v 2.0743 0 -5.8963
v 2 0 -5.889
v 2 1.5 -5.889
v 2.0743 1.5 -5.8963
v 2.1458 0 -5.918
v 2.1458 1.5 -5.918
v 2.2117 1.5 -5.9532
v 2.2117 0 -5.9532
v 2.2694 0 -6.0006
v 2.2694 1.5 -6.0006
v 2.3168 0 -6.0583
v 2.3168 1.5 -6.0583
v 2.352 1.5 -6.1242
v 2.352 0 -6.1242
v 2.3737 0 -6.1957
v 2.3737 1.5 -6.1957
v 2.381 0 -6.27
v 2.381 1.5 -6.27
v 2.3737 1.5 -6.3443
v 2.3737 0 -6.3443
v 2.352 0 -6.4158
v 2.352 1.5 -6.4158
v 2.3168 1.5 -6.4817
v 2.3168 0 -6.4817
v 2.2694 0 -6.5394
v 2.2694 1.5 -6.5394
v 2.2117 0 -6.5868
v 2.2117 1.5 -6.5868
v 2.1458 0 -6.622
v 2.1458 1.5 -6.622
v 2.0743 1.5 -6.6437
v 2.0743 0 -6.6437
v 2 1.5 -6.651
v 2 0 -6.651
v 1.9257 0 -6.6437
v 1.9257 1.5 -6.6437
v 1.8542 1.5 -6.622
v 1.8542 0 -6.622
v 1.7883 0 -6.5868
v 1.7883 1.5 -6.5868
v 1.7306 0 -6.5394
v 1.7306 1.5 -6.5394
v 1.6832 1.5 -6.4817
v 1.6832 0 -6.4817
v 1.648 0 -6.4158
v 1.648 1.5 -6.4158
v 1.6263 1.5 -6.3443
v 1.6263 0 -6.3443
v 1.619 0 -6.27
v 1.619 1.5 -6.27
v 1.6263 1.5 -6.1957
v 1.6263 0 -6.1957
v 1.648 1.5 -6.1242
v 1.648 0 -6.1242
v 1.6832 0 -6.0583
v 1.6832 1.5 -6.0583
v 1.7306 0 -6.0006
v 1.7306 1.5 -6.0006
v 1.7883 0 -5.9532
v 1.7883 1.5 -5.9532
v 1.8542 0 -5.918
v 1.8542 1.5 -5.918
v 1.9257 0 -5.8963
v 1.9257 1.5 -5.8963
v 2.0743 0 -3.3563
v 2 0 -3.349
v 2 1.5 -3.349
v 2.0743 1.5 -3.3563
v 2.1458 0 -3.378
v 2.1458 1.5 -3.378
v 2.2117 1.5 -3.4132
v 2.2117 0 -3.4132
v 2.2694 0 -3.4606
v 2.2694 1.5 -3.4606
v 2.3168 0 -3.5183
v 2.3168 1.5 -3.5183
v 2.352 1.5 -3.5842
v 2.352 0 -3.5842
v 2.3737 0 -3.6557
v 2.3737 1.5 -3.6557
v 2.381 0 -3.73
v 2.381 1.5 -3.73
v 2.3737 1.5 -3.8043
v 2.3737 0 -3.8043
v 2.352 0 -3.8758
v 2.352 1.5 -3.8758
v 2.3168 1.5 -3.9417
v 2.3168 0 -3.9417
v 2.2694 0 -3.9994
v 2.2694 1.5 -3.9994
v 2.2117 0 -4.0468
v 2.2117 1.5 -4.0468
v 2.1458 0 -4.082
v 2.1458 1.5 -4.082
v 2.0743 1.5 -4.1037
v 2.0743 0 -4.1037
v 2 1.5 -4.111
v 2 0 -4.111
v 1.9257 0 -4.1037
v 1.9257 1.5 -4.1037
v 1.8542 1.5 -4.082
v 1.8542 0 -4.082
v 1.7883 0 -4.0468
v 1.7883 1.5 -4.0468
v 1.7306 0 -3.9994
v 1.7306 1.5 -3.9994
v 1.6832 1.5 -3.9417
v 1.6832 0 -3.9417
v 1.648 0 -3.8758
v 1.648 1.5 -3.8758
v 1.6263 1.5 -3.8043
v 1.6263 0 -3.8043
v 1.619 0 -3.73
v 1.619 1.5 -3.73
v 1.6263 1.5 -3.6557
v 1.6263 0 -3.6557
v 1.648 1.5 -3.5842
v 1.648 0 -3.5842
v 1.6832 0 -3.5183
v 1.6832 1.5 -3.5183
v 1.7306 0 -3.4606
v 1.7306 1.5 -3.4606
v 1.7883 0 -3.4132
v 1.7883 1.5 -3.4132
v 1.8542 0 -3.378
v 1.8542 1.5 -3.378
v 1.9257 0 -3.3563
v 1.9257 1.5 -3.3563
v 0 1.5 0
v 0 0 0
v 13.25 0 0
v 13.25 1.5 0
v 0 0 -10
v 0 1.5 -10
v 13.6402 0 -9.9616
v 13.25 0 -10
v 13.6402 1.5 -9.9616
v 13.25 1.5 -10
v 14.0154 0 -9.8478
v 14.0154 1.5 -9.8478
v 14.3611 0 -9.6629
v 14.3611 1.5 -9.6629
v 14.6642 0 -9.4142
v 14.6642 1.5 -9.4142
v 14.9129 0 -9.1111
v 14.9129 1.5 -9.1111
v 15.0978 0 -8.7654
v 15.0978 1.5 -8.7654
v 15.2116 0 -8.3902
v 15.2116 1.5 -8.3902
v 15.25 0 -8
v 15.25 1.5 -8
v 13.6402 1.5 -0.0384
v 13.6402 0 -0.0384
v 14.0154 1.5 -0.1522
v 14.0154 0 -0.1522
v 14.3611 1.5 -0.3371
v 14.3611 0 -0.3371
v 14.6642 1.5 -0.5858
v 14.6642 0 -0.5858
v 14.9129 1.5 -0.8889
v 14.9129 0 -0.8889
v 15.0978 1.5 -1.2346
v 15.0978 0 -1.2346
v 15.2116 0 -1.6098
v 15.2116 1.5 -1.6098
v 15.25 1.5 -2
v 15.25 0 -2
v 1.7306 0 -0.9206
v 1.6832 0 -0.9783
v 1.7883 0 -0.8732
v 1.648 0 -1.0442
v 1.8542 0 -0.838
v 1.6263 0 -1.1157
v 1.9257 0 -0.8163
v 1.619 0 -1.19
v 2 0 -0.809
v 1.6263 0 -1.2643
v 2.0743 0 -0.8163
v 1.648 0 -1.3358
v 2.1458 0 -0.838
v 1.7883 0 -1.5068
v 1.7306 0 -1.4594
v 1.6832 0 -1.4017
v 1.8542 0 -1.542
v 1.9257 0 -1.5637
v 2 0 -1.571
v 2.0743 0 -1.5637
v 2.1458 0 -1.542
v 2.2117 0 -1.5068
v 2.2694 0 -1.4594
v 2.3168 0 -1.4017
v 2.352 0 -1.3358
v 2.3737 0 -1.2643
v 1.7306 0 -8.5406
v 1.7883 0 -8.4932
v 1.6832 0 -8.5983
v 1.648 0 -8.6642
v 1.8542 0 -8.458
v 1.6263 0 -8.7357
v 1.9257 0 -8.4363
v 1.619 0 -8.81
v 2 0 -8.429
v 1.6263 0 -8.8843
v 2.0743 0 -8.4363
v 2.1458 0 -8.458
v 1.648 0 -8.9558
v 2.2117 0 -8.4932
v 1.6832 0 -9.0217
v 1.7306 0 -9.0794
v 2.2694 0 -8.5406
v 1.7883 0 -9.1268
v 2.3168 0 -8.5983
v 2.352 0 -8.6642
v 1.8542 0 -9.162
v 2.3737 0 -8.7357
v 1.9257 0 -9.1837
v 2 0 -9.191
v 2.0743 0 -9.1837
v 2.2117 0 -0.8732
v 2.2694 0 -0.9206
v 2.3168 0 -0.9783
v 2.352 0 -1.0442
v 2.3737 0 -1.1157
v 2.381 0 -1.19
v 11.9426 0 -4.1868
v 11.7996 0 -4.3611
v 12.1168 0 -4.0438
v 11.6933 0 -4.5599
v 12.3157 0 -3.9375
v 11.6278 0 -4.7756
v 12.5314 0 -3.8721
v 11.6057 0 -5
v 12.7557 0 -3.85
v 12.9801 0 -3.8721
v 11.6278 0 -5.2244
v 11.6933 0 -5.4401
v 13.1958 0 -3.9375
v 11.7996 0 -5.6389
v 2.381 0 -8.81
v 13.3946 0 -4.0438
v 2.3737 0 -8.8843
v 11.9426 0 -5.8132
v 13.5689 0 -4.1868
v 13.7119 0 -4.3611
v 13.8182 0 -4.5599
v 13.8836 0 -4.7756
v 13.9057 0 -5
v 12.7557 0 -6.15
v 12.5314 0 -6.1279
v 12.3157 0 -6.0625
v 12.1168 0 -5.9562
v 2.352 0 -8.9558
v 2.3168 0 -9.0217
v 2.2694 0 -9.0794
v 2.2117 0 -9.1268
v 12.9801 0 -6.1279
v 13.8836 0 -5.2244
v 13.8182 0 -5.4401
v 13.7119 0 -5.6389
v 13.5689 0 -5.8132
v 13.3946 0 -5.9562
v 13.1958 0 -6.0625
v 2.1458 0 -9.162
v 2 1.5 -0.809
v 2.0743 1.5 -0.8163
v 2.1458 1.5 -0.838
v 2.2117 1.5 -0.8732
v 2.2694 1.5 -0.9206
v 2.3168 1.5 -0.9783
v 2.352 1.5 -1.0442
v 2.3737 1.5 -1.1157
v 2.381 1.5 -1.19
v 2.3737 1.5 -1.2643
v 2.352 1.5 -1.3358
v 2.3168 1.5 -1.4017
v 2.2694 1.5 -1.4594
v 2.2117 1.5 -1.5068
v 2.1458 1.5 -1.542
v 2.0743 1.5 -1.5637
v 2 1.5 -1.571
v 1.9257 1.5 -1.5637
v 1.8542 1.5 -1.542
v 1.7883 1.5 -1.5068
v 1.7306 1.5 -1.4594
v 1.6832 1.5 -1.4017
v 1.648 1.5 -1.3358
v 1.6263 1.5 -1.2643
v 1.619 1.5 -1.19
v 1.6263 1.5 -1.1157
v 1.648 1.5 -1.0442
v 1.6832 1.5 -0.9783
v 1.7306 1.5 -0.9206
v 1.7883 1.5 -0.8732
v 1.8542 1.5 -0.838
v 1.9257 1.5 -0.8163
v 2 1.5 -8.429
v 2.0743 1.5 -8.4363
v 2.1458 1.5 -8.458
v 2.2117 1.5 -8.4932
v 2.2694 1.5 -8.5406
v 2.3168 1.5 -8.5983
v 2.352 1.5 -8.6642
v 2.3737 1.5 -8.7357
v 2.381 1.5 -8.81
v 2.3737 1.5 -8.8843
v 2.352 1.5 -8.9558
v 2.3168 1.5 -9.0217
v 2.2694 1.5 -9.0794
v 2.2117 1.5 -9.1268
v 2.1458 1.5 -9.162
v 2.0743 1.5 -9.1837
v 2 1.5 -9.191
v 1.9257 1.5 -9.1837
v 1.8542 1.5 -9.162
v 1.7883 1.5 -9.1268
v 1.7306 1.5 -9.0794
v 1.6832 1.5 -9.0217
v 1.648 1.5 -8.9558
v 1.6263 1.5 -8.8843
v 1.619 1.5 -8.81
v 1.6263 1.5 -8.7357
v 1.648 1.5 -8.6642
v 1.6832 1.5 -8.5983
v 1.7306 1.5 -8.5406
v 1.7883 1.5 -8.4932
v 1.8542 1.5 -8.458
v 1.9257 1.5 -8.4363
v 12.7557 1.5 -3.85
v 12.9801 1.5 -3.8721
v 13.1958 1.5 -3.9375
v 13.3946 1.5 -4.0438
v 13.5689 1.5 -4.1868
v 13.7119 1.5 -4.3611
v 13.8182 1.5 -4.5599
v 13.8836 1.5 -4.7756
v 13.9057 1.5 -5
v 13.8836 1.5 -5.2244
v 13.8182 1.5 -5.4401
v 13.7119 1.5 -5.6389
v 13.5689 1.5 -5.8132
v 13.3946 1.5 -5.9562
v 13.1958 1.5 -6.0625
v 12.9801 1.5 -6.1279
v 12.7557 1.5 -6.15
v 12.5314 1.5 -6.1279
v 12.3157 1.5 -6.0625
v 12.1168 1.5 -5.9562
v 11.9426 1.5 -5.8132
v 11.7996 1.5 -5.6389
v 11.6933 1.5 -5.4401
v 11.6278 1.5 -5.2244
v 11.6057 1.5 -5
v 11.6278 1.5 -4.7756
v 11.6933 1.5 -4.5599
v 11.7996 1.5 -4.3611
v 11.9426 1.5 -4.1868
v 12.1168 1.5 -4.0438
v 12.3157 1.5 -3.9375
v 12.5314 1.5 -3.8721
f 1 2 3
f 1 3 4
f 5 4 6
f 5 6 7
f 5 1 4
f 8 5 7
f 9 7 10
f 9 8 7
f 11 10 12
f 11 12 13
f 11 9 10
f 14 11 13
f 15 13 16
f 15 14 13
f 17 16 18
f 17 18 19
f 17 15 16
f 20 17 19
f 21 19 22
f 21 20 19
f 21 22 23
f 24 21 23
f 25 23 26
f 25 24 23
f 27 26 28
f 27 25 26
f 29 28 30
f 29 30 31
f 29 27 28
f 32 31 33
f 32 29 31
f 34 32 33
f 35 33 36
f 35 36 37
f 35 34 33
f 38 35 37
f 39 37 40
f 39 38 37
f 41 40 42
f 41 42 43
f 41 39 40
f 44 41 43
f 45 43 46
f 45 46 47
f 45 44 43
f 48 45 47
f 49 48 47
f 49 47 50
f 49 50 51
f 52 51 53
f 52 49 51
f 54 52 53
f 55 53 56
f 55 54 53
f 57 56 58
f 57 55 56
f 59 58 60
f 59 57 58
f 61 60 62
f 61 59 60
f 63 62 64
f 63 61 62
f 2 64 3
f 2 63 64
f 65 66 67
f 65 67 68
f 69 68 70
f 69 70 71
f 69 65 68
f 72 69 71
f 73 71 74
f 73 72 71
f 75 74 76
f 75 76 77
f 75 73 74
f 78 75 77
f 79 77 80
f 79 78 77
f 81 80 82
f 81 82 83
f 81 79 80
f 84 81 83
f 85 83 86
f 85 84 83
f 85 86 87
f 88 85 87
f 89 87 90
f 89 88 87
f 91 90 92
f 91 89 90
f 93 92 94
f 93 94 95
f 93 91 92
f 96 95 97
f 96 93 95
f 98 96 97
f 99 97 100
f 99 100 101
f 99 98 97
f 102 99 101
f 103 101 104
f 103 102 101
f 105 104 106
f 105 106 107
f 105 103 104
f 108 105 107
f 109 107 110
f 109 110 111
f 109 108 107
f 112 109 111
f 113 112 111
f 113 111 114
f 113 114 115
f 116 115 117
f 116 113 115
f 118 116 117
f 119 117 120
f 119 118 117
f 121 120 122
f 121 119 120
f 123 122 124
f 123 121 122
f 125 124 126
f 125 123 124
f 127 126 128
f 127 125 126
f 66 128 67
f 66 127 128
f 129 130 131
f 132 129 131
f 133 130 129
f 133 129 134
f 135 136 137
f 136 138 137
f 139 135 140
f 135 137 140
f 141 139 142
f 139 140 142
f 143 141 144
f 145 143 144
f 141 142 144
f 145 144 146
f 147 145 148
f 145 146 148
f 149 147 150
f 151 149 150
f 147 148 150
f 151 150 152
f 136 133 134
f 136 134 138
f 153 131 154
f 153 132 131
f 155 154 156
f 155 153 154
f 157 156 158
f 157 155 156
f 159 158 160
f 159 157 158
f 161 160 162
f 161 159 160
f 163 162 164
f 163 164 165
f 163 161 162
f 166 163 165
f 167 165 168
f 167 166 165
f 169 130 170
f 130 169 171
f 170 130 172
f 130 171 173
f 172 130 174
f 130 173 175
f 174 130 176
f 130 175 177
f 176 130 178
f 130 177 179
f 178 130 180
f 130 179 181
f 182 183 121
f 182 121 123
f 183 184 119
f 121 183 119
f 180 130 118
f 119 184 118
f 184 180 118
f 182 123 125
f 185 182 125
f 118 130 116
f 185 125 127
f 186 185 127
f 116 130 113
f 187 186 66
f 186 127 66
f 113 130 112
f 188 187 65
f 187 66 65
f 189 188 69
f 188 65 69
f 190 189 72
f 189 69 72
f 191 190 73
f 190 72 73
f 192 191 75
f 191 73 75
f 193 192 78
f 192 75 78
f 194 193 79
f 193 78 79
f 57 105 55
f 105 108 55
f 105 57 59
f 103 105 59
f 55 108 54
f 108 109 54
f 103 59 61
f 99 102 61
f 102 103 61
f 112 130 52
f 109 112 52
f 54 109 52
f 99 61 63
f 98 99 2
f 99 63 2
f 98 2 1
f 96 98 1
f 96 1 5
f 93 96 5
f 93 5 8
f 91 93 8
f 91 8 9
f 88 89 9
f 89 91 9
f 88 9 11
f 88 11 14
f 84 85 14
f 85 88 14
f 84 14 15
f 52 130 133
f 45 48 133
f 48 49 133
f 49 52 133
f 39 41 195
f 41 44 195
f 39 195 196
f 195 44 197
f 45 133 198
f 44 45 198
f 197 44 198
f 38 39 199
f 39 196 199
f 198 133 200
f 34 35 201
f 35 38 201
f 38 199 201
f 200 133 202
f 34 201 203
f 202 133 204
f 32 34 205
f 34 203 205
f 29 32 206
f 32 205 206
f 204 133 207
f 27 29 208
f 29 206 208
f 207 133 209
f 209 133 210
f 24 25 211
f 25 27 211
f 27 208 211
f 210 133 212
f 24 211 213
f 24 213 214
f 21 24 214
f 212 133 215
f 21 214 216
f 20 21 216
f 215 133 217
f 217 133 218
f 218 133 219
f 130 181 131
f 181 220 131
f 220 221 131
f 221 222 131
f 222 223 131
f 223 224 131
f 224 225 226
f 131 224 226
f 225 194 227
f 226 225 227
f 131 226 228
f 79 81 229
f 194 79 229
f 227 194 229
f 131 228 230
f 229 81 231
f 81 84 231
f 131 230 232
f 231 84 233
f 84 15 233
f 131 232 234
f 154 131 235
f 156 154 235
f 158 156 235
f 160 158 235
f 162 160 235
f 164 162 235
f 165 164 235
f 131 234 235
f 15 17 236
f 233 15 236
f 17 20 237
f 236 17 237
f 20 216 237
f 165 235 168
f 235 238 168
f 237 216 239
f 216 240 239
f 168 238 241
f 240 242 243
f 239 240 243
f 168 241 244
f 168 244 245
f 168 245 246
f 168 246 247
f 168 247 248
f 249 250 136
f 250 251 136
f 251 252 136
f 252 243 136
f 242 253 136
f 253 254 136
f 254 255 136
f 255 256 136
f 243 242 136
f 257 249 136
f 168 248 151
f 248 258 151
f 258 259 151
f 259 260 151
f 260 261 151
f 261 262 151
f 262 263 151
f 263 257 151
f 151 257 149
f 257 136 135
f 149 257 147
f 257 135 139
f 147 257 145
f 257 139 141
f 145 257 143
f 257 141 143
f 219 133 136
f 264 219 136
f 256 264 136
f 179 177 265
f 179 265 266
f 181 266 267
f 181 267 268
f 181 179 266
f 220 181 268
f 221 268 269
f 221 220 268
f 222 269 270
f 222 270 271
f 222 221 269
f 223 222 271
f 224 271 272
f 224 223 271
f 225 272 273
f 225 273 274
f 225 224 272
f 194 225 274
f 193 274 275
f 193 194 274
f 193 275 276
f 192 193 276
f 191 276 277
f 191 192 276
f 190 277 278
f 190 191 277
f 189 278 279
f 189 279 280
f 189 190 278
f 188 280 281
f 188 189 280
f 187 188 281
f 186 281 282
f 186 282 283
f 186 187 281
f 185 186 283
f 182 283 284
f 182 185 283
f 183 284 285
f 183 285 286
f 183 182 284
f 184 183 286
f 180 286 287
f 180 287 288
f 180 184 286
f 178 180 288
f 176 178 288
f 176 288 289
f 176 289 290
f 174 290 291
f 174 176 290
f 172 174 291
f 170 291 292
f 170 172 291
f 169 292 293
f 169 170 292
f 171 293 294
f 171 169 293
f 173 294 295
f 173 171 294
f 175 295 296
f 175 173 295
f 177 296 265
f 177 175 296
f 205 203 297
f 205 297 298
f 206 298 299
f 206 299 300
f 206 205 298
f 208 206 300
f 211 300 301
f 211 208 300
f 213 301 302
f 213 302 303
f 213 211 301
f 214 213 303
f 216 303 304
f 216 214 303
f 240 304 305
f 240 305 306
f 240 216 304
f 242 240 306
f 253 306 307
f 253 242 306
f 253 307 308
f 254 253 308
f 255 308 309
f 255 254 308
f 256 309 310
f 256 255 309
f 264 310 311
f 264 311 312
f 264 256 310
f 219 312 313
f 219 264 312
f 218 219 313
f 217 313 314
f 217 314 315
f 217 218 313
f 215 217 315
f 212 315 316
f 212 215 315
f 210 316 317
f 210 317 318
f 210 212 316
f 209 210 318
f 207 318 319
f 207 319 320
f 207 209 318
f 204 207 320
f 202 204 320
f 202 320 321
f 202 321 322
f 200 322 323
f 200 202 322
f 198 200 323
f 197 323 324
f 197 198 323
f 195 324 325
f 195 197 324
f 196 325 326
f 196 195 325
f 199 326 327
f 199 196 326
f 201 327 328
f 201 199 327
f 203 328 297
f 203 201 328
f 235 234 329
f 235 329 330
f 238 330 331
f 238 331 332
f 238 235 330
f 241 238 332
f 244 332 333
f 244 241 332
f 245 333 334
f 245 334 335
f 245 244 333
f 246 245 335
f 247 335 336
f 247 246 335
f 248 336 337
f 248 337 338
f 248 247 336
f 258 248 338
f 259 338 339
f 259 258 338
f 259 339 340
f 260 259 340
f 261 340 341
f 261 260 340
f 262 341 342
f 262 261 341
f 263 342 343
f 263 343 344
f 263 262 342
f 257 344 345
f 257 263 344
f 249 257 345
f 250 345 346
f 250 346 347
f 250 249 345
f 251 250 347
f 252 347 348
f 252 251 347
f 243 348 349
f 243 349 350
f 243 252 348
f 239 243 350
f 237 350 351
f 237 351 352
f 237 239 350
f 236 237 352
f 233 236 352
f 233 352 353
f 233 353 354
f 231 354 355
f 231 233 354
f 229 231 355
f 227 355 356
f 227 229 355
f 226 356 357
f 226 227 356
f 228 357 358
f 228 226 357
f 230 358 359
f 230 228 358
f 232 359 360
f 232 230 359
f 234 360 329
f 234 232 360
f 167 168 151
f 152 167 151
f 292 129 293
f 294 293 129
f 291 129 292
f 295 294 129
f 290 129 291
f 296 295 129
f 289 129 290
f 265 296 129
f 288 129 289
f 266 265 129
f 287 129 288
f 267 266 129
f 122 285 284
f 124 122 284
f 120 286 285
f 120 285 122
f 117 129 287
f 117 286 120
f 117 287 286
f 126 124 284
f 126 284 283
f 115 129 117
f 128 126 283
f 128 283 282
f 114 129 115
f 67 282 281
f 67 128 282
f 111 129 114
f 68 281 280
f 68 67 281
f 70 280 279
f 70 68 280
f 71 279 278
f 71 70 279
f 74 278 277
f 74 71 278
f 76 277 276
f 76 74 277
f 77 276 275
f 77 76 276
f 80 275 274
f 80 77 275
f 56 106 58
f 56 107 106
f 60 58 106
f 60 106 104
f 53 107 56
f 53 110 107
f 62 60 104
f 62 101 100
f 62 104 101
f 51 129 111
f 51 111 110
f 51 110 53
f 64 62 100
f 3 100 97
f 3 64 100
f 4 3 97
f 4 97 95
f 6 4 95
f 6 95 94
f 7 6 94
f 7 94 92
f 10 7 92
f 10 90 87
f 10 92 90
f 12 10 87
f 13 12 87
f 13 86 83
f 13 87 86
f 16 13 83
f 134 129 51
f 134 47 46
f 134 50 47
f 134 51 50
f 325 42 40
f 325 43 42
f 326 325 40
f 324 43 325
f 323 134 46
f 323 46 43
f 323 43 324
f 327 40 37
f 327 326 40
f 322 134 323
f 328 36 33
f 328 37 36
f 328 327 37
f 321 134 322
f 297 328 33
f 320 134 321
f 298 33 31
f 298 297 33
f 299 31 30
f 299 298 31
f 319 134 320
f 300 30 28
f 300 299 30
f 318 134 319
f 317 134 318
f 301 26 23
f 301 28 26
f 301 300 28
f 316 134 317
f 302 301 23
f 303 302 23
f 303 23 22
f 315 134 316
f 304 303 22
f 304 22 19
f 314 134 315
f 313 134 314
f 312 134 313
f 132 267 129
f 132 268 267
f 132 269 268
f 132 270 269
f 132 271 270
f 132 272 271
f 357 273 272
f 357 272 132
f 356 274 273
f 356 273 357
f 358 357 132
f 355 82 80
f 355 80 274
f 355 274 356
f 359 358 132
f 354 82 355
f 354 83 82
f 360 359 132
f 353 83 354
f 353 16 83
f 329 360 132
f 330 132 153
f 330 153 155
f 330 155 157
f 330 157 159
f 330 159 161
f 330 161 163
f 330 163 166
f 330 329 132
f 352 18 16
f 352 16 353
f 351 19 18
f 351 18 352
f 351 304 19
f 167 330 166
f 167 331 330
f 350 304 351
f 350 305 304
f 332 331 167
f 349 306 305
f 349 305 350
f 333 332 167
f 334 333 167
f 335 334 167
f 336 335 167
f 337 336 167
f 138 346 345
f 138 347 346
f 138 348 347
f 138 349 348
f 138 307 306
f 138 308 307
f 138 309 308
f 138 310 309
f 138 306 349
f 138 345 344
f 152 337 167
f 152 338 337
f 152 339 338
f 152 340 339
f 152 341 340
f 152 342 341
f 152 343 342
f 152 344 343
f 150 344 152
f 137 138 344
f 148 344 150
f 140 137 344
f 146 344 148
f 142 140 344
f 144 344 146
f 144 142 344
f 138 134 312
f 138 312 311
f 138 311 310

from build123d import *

# Parameters (mm, degrees)
SKETCH1_W           = 15.25
SKETCH1_H           = 10
SKETCH1_R           = 1.15
SKETCH1_R_2         = 0.381
BOSS_EXTRUDE1_DEPTH = 1.5
FILLET2_R           = 2


with BuildPart() as part:
    # Sketch1 → Boss-Extrude1 (new body)
    with BuildSketch(Plane(origin=(0, 0, 0), x_dir=(1, 0, 0), z_dir=(0, 1, 0))):
        with Locations((7.625, 5)):
            Rectangle(SKETCH1_W, SKETCH1_H)
        with Locations(Location((12.755741127, 5, 0), (0, 0, 270))):
            Circle(SKETCH1_R, mode=Mode.SUBTRACT)
        with Locations(Location((2, 6.27, 0), (0, 0, 270))):
            Circle(SKETCH1_R_2, mode=Mode.SUBTRACT)
        with Locations(Location((2, 3.73, 0), (0, 0, 270))):
            Circle(SKETCH1_R_2, mode=Mode.SUBTRACT)
        with Locations(Location((2, 1.19, 0), (0, 0, 270))):
            Circle(SKETCH1_R_2, mode=Mode.SUBTRACT)
        with Locations(Location((2, 8.81, 0), (0, 0, 270))):
            Circle(SKETCH1_R_2, mode=Mode.SUBTRACT)
    extrude(amount=BOSS_EXTRUDE1_DEPTH)

    # Fillet2
    fillet2_edges = [part.edges().sort_by_distance(p)[0] for p in [
        (15.25, 0.75, -10),
        (15.25, 0.75, 0),
    ]]
    fillet(fillet2_edges, radius=FILLET2_R)


solid = part.part
